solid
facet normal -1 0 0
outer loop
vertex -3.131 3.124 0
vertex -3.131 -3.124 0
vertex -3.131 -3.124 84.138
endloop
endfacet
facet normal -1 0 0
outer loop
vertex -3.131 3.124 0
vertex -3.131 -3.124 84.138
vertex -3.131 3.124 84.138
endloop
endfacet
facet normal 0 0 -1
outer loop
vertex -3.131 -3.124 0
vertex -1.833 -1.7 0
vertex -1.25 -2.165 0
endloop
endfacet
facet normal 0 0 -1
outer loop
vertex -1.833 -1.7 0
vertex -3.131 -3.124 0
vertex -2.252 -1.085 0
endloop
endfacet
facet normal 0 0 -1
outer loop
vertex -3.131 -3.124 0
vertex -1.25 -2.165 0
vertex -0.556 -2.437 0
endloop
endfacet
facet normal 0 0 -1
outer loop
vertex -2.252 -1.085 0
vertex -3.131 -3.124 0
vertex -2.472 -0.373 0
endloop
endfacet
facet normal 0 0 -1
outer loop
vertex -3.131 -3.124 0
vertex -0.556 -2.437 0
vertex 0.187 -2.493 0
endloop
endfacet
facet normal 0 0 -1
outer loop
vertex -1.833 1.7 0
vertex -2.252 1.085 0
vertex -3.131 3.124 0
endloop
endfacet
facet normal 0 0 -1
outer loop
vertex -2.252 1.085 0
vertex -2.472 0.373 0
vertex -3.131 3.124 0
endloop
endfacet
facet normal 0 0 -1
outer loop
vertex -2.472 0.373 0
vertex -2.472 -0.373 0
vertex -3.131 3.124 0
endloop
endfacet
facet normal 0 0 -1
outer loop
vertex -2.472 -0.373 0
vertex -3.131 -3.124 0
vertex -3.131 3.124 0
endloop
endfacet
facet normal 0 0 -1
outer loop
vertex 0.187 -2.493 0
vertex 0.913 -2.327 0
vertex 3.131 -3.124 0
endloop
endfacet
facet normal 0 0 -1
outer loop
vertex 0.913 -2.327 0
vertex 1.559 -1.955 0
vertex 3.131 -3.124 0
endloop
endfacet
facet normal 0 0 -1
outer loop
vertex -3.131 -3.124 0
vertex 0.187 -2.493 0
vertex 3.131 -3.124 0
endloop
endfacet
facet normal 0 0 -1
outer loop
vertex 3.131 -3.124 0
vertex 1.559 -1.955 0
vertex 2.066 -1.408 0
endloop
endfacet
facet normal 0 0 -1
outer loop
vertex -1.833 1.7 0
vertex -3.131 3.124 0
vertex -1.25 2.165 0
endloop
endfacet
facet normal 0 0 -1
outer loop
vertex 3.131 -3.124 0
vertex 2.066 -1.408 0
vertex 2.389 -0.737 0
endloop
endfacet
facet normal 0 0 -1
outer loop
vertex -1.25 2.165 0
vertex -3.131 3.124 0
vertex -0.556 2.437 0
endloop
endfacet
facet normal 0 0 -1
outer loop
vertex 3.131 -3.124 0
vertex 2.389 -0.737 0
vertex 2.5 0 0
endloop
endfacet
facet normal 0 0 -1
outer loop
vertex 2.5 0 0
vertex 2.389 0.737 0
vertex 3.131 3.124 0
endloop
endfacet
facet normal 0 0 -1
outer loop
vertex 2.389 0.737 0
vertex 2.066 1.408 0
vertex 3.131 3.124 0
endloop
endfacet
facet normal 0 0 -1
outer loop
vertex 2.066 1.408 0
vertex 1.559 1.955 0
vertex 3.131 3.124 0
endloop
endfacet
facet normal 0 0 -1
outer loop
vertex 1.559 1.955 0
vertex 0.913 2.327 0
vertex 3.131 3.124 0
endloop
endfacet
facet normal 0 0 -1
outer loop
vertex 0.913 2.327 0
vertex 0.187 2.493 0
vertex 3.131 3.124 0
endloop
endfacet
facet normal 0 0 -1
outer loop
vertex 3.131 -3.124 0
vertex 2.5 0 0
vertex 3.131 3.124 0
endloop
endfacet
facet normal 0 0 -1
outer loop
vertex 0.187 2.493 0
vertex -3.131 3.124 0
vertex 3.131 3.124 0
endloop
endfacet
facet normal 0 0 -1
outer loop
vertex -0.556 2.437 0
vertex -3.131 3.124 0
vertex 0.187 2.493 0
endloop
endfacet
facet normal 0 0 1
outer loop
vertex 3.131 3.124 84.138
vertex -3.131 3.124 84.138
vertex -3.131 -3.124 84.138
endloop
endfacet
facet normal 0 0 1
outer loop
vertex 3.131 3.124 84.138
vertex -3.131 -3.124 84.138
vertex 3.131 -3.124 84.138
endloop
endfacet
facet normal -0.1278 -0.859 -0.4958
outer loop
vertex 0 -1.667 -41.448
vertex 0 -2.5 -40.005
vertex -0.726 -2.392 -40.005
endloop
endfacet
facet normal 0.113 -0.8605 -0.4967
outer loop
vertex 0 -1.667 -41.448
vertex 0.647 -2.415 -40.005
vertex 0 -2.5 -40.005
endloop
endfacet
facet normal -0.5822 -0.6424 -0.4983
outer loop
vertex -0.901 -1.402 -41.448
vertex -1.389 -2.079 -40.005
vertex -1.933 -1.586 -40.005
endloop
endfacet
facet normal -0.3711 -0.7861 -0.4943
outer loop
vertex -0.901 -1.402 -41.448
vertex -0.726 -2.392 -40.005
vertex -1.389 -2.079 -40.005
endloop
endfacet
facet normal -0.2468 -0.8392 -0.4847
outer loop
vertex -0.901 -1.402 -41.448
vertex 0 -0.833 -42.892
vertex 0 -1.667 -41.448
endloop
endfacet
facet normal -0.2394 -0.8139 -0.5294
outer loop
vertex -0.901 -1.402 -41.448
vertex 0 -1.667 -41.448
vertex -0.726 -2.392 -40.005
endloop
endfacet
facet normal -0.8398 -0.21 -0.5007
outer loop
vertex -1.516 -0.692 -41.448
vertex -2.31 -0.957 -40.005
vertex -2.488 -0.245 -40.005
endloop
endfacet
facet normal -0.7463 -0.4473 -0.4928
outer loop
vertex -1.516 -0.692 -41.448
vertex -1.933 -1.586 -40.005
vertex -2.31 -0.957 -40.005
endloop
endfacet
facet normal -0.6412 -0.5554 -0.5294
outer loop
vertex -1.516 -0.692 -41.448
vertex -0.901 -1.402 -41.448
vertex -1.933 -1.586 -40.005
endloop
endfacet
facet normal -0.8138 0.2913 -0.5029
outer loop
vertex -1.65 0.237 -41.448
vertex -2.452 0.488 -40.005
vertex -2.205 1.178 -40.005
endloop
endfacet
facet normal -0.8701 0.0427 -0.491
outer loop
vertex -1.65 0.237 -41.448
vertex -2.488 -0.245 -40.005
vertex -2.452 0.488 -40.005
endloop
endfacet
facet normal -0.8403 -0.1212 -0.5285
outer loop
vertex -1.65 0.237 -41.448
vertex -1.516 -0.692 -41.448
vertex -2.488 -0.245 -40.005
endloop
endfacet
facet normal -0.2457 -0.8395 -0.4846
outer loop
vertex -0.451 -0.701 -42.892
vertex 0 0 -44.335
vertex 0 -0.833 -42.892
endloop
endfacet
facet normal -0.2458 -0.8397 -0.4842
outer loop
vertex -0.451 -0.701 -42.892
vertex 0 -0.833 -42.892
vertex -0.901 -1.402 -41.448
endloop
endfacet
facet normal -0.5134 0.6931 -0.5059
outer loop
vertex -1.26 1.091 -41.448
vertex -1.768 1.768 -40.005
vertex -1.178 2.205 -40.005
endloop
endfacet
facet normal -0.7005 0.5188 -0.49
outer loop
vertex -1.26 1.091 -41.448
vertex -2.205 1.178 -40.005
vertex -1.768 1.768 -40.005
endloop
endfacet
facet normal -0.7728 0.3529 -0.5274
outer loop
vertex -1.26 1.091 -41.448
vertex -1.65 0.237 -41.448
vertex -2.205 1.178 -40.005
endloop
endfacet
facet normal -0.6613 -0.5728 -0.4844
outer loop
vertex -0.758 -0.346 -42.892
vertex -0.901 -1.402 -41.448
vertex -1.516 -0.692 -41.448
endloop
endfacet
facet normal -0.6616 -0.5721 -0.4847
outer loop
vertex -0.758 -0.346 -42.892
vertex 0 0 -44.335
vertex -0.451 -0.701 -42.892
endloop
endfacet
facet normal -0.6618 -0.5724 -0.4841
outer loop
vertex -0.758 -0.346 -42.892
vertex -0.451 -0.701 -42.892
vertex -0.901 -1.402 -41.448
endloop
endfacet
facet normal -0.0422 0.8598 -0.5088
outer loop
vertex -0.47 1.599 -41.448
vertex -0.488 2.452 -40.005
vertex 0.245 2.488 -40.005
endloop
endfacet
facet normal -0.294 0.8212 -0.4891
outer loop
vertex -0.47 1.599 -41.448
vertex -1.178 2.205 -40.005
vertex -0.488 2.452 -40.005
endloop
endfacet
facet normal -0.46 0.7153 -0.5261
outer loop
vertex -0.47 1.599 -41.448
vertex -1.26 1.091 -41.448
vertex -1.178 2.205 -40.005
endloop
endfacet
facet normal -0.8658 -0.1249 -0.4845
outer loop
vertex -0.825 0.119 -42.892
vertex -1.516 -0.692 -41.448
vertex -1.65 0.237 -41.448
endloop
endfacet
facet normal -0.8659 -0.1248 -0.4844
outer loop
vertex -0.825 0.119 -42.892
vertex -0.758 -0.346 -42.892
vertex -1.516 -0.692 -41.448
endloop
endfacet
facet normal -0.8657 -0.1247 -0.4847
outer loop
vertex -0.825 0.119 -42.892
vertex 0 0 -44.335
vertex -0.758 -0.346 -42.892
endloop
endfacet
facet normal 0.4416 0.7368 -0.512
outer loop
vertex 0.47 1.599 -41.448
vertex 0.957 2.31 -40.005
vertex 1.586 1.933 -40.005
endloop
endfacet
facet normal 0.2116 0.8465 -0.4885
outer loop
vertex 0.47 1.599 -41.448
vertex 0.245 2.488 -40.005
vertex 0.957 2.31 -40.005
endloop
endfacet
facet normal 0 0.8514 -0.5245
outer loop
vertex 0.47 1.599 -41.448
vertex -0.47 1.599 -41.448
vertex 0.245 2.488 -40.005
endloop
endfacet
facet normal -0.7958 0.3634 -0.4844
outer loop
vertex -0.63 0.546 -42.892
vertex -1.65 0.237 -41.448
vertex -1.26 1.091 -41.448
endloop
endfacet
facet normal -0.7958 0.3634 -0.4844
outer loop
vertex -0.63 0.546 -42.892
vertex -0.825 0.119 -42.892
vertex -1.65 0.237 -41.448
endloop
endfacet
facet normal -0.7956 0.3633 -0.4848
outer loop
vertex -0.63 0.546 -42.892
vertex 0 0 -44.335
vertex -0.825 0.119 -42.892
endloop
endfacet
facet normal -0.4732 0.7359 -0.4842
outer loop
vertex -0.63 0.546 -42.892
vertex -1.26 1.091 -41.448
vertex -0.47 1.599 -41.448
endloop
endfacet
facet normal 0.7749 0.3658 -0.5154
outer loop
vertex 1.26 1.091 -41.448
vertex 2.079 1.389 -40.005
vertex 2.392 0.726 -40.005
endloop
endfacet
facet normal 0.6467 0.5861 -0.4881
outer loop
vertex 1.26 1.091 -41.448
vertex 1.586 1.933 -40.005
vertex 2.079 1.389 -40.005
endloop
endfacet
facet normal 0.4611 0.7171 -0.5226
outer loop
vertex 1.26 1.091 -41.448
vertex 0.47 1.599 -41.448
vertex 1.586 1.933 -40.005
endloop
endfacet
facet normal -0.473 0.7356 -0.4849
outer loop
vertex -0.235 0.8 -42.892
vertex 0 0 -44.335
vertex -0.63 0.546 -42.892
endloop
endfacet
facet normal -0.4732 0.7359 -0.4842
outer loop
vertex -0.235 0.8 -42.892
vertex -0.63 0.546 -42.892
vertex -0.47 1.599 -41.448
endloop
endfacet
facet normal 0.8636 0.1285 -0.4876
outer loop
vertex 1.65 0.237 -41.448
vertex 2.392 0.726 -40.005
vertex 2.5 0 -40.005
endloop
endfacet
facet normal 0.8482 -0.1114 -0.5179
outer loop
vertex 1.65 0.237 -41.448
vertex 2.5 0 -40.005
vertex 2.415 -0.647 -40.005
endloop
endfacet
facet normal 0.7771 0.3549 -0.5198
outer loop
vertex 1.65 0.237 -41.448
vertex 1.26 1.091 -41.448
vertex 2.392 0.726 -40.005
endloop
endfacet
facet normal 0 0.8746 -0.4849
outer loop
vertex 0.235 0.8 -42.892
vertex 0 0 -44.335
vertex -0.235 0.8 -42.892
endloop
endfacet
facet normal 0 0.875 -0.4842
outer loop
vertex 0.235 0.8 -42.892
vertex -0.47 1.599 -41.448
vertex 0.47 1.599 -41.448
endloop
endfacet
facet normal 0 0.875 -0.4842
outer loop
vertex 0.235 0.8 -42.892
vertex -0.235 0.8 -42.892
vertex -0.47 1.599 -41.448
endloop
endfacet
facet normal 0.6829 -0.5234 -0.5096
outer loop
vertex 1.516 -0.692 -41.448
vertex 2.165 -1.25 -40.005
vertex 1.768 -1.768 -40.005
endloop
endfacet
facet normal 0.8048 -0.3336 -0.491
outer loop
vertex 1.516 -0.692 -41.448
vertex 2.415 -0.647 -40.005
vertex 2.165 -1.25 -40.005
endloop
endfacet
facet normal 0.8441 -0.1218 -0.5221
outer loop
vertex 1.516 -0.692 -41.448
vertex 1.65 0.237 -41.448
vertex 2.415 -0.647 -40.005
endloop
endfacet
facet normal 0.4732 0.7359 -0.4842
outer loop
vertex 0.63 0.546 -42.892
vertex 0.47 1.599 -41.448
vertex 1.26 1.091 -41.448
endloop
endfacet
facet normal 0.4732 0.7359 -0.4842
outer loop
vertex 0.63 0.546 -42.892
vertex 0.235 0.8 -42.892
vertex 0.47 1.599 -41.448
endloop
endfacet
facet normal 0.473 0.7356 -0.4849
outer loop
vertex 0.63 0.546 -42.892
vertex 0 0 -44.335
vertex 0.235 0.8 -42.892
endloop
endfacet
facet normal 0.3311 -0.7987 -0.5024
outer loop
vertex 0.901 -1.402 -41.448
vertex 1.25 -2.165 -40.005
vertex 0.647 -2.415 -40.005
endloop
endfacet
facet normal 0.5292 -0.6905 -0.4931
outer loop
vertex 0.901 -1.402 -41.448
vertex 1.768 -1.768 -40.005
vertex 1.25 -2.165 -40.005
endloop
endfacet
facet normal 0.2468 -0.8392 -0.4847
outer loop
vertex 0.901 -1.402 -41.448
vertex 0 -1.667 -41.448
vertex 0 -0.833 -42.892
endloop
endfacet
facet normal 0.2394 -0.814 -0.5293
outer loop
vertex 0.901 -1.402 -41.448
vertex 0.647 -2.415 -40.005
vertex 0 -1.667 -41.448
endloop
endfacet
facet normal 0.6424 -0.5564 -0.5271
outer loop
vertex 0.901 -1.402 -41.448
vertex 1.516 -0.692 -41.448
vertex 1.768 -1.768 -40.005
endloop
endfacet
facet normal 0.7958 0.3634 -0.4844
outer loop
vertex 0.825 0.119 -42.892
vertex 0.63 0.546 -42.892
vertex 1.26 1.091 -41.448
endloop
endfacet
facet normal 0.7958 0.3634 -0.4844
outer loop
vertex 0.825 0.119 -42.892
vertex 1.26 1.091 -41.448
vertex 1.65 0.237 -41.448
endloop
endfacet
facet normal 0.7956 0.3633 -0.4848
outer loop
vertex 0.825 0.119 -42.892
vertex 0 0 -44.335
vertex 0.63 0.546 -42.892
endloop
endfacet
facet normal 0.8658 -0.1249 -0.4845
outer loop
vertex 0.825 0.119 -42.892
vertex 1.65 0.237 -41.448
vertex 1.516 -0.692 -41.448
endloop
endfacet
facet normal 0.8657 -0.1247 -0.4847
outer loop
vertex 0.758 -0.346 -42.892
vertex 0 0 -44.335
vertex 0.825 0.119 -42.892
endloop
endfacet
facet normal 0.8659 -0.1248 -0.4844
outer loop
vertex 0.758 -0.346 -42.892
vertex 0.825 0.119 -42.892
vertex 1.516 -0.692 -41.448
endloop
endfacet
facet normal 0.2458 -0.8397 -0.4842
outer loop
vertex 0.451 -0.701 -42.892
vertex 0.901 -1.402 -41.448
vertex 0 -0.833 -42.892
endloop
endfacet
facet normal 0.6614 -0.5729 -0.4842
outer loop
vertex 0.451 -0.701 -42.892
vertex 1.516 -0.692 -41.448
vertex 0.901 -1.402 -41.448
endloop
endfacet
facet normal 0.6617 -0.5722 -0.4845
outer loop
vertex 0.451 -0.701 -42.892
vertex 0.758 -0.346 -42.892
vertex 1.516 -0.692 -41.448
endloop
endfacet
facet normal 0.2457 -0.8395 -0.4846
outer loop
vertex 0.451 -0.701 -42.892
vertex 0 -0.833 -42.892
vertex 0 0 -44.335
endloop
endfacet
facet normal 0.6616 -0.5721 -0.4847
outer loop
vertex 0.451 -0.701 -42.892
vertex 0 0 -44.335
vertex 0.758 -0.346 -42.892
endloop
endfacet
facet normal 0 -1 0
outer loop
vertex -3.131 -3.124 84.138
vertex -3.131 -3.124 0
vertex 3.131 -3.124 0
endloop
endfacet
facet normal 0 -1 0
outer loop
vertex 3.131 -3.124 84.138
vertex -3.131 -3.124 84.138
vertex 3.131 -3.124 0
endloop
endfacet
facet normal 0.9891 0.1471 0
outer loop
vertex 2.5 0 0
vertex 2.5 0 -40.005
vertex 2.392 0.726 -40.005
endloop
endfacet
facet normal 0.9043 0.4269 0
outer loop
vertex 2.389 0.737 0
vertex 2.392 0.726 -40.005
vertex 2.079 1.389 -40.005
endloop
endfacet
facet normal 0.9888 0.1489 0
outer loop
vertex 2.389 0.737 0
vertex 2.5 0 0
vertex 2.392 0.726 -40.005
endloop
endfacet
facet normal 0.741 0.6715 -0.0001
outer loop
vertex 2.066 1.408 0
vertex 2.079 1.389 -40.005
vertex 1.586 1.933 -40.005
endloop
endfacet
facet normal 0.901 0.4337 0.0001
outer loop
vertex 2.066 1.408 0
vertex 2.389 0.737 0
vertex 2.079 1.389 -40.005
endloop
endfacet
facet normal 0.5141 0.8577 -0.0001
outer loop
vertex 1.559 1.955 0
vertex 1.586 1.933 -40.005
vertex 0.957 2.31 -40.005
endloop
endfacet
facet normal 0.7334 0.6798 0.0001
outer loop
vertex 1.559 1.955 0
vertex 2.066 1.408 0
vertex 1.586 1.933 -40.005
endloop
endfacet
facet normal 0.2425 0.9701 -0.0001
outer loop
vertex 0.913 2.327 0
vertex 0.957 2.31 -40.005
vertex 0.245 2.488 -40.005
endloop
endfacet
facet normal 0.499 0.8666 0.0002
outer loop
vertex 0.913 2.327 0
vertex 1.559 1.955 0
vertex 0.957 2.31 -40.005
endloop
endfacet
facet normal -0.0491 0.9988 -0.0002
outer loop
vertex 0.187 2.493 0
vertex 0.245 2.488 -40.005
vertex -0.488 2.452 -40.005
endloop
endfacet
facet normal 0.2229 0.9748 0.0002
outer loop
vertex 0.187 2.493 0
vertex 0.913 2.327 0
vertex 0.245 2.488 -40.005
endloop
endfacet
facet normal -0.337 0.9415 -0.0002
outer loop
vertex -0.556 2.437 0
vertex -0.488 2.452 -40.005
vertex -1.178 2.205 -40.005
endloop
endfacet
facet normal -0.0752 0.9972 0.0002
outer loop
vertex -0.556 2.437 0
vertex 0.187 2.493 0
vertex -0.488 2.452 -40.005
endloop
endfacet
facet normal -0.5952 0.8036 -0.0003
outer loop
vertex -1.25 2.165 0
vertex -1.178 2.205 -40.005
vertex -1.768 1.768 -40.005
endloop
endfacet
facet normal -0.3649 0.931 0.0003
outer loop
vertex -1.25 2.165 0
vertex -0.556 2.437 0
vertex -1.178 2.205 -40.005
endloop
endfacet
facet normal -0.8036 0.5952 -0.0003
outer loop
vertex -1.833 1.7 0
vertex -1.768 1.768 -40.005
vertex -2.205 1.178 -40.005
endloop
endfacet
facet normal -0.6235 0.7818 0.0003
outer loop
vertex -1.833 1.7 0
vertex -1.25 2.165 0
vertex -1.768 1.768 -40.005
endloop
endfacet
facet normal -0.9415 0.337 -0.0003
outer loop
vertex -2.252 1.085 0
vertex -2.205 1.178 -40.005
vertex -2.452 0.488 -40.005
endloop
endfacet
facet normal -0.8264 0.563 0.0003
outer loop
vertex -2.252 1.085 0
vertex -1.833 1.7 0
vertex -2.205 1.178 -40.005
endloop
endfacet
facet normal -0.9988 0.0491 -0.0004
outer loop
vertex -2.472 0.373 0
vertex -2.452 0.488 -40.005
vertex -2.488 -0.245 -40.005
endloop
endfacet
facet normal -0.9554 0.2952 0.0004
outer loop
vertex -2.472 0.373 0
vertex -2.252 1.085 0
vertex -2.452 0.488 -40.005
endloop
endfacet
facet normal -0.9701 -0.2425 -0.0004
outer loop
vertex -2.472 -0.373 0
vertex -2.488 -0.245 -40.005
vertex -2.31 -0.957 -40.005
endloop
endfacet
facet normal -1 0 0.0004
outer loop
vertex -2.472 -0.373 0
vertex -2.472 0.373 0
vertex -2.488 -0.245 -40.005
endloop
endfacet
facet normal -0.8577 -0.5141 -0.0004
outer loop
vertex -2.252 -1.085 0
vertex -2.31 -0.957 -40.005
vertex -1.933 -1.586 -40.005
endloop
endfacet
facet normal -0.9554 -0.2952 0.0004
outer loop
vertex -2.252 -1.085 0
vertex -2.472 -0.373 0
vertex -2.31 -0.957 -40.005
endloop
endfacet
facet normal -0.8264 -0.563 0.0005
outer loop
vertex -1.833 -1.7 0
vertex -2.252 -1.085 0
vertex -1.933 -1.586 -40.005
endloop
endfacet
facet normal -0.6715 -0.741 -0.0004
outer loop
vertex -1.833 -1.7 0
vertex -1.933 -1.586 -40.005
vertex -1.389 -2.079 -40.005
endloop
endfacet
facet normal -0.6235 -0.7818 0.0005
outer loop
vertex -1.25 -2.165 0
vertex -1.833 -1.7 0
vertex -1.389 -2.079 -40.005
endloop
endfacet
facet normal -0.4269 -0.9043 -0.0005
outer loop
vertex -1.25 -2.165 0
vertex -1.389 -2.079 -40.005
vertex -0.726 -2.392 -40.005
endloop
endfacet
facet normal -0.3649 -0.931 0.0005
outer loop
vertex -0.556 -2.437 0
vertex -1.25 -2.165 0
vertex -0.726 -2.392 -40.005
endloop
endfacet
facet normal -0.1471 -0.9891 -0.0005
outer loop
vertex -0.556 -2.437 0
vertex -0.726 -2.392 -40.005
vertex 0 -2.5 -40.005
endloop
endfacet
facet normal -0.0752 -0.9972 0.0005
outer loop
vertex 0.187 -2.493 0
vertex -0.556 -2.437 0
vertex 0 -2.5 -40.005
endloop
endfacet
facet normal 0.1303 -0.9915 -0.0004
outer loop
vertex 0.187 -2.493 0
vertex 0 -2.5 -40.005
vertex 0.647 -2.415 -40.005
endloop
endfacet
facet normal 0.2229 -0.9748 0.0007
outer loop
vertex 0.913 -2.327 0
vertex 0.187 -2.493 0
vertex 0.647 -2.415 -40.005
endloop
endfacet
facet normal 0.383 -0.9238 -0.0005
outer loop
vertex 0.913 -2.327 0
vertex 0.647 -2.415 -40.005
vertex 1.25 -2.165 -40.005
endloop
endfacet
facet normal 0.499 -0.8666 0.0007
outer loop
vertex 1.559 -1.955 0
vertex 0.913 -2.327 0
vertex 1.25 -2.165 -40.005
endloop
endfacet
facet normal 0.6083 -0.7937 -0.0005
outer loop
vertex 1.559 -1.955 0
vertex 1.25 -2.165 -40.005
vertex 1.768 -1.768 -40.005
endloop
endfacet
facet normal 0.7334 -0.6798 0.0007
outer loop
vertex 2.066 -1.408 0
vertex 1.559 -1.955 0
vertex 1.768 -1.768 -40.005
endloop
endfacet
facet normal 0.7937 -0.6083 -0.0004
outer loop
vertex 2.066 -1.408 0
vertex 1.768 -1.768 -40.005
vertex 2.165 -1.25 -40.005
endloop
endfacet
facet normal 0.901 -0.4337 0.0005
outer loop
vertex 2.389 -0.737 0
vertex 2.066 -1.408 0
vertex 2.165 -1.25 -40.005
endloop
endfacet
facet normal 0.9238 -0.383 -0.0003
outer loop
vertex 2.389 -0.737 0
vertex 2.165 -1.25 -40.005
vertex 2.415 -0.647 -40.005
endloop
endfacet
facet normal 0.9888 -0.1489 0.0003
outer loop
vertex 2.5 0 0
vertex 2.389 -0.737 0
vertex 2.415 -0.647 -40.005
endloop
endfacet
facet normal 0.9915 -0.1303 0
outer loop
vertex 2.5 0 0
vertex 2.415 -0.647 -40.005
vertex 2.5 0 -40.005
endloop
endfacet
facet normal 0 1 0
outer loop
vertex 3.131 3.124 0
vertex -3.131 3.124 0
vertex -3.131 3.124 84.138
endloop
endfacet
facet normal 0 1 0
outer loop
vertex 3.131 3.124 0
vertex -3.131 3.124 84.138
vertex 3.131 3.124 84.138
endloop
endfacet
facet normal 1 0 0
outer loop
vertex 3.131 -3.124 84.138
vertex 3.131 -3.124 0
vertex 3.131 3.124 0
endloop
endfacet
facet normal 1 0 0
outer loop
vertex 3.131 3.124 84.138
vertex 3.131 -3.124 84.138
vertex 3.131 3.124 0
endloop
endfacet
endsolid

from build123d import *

# Parameters (mm, degrees)
SKETCH1_W           = 6.2611
SKETCH1_H           = 6.2484
BOSS_EXTRUDE1_DEPTH = 84.1375
SKETCH1_4_R         = 2.499995
BOSS_EXTRUDE2_DEPTH = 40.005


with BuildPart() as part:
    # Sketch1 → Boss-Extrude1 (new body)
    with BuildSketch(Plane.XY):
        Rectangle(SKETCH1_W, SKETCH1_H)
    extrude(amount=BOSS_EXTRUDE1_DEPTH)

    # Sketch1<4> → Boss-Extrude2 (add)
    with BuildSketch(Plane.XY):
        Circle(SKETCH1_4_R)
    extrude(amount=-BOSS_EXTRUDE2_DEPTH)

    # Boss-Extrude3 cone 1 section (through the dimple's axis) → Boss-Extrude3 (revolve)
    with BuildSketch(Plane(origin=(0, 0, -40.005), x_dir=(0, -1, 0), z_dir=(1, 0, 0))):
        Polygon((0, 0), (2.499995, 0), (0, 4.330118359), align=None)
    revolve(axis=Axis((0, 0, -40.005), (0, 0, -1)))


solid = part.part
